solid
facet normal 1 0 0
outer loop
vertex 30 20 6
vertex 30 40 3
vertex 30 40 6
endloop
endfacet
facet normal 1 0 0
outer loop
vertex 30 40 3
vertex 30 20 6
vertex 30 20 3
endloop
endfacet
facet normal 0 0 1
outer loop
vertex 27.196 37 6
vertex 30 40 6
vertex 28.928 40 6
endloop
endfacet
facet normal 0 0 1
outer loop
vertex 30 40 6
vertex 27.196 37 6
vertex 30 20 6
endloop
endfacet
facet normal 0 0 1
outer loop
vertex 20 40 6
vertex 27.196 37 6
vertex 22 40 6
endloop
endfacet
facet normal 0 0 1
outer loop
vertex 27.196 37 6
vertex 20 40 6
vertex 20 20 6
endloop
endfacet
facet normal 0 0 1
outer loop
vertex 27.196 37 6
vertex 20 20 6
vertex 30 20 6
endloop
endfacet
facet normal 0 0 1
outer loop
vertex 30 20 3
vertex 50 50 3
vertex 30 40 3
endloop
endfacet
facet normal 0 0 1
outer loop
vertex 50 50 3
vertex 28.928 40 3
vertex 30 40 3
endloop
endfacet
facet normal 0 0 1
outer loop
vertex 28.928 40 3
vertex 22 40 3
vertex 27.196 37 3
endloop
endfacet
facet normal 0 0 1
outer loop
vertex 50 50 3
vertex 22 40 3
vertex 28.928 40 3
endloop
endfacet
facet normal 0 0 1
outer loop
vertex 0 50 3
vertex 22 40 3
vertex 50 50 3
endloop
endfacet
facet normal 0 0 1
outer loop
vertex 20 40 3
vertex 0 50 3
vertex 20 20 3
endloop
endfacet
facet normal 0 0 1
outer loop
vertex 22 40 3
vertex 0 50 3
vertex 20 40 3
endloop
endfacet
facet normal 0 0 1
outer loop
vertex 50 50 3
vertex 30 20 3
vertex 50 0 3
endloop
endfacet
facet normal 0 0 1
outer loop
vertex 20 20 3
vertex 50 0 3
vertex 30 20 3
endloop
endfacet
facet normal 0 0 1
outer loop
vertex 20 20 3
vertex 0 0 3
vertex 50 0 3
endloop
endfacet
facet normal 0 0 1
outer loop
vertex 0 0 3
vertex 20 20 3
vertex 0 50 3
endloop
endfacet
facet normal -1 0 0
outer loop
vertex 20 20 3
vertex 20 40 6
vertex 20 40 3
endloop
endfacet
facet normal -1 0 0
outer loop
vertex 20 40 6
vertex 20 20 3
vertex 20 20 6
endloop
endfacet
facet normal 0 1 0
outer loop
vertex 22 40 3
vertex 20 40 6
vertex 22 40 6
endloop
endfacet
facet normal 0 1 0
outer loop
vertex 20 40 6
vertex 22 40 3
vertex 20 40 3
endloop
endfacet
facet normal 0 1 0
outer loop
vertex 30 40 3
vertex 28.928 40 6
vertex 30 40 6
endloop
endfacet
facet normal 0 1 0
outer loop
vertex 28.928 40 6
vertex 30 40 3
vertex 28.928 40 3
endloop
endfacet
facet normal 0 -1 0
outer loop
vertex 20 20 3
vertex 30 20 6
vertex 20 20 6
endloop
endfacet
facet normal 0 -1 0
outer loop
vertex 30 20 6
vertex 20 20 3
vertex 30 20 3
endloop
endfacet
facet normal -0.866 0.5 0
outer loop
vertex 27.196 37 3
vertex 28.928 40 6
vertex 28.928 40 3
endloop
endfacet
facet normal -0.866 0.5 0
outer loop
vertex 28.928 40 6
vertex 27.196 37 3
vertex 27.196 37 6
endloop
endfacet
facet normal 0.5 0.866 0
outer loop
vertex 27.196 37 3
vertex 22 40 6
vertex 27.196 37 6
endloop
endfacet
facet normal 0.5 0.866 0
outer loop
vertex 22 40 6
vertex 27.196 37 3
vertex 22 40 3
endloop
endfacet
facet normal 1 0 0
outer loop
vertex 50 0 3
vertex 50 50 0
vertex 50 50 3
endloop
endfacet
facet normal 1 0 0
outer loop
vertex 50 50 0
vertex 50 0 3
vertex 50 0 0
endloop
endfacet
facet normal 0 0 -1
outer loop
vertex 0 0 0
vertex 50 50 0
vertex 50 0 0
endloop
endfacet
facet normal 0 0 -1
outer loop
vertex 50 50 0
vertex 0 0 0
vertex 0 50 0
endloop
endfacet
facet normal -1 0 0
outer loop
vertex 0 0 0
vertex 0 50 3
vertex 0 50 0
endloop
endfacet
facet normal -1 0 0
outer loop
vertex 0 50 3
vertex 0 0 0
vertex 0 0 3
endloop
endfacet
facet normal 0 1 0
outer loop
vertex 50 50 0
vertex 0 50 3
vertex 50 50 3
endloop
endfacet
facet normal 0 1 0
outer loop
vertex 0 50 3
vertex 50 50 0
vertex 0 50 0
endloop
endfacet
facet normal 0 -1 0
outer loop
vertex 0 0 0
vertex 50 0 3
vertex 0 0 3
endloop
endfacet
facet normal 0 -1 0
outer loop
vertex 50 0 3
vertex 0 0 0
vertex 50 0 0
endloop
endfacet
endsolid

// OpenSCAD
module clip() {
    difference() {
        cube([10, 20, 3]); // Base
        translate([2, 20, 0]) 
            rotate([0, 0, -30]) cube([6, 8, 3]); // Lengüeta
    }
}

// Ver cómo encaja el clip en una base
cube([50, 50, 3]); // Base de prueba
translate([20, 20, 3]) clip();
